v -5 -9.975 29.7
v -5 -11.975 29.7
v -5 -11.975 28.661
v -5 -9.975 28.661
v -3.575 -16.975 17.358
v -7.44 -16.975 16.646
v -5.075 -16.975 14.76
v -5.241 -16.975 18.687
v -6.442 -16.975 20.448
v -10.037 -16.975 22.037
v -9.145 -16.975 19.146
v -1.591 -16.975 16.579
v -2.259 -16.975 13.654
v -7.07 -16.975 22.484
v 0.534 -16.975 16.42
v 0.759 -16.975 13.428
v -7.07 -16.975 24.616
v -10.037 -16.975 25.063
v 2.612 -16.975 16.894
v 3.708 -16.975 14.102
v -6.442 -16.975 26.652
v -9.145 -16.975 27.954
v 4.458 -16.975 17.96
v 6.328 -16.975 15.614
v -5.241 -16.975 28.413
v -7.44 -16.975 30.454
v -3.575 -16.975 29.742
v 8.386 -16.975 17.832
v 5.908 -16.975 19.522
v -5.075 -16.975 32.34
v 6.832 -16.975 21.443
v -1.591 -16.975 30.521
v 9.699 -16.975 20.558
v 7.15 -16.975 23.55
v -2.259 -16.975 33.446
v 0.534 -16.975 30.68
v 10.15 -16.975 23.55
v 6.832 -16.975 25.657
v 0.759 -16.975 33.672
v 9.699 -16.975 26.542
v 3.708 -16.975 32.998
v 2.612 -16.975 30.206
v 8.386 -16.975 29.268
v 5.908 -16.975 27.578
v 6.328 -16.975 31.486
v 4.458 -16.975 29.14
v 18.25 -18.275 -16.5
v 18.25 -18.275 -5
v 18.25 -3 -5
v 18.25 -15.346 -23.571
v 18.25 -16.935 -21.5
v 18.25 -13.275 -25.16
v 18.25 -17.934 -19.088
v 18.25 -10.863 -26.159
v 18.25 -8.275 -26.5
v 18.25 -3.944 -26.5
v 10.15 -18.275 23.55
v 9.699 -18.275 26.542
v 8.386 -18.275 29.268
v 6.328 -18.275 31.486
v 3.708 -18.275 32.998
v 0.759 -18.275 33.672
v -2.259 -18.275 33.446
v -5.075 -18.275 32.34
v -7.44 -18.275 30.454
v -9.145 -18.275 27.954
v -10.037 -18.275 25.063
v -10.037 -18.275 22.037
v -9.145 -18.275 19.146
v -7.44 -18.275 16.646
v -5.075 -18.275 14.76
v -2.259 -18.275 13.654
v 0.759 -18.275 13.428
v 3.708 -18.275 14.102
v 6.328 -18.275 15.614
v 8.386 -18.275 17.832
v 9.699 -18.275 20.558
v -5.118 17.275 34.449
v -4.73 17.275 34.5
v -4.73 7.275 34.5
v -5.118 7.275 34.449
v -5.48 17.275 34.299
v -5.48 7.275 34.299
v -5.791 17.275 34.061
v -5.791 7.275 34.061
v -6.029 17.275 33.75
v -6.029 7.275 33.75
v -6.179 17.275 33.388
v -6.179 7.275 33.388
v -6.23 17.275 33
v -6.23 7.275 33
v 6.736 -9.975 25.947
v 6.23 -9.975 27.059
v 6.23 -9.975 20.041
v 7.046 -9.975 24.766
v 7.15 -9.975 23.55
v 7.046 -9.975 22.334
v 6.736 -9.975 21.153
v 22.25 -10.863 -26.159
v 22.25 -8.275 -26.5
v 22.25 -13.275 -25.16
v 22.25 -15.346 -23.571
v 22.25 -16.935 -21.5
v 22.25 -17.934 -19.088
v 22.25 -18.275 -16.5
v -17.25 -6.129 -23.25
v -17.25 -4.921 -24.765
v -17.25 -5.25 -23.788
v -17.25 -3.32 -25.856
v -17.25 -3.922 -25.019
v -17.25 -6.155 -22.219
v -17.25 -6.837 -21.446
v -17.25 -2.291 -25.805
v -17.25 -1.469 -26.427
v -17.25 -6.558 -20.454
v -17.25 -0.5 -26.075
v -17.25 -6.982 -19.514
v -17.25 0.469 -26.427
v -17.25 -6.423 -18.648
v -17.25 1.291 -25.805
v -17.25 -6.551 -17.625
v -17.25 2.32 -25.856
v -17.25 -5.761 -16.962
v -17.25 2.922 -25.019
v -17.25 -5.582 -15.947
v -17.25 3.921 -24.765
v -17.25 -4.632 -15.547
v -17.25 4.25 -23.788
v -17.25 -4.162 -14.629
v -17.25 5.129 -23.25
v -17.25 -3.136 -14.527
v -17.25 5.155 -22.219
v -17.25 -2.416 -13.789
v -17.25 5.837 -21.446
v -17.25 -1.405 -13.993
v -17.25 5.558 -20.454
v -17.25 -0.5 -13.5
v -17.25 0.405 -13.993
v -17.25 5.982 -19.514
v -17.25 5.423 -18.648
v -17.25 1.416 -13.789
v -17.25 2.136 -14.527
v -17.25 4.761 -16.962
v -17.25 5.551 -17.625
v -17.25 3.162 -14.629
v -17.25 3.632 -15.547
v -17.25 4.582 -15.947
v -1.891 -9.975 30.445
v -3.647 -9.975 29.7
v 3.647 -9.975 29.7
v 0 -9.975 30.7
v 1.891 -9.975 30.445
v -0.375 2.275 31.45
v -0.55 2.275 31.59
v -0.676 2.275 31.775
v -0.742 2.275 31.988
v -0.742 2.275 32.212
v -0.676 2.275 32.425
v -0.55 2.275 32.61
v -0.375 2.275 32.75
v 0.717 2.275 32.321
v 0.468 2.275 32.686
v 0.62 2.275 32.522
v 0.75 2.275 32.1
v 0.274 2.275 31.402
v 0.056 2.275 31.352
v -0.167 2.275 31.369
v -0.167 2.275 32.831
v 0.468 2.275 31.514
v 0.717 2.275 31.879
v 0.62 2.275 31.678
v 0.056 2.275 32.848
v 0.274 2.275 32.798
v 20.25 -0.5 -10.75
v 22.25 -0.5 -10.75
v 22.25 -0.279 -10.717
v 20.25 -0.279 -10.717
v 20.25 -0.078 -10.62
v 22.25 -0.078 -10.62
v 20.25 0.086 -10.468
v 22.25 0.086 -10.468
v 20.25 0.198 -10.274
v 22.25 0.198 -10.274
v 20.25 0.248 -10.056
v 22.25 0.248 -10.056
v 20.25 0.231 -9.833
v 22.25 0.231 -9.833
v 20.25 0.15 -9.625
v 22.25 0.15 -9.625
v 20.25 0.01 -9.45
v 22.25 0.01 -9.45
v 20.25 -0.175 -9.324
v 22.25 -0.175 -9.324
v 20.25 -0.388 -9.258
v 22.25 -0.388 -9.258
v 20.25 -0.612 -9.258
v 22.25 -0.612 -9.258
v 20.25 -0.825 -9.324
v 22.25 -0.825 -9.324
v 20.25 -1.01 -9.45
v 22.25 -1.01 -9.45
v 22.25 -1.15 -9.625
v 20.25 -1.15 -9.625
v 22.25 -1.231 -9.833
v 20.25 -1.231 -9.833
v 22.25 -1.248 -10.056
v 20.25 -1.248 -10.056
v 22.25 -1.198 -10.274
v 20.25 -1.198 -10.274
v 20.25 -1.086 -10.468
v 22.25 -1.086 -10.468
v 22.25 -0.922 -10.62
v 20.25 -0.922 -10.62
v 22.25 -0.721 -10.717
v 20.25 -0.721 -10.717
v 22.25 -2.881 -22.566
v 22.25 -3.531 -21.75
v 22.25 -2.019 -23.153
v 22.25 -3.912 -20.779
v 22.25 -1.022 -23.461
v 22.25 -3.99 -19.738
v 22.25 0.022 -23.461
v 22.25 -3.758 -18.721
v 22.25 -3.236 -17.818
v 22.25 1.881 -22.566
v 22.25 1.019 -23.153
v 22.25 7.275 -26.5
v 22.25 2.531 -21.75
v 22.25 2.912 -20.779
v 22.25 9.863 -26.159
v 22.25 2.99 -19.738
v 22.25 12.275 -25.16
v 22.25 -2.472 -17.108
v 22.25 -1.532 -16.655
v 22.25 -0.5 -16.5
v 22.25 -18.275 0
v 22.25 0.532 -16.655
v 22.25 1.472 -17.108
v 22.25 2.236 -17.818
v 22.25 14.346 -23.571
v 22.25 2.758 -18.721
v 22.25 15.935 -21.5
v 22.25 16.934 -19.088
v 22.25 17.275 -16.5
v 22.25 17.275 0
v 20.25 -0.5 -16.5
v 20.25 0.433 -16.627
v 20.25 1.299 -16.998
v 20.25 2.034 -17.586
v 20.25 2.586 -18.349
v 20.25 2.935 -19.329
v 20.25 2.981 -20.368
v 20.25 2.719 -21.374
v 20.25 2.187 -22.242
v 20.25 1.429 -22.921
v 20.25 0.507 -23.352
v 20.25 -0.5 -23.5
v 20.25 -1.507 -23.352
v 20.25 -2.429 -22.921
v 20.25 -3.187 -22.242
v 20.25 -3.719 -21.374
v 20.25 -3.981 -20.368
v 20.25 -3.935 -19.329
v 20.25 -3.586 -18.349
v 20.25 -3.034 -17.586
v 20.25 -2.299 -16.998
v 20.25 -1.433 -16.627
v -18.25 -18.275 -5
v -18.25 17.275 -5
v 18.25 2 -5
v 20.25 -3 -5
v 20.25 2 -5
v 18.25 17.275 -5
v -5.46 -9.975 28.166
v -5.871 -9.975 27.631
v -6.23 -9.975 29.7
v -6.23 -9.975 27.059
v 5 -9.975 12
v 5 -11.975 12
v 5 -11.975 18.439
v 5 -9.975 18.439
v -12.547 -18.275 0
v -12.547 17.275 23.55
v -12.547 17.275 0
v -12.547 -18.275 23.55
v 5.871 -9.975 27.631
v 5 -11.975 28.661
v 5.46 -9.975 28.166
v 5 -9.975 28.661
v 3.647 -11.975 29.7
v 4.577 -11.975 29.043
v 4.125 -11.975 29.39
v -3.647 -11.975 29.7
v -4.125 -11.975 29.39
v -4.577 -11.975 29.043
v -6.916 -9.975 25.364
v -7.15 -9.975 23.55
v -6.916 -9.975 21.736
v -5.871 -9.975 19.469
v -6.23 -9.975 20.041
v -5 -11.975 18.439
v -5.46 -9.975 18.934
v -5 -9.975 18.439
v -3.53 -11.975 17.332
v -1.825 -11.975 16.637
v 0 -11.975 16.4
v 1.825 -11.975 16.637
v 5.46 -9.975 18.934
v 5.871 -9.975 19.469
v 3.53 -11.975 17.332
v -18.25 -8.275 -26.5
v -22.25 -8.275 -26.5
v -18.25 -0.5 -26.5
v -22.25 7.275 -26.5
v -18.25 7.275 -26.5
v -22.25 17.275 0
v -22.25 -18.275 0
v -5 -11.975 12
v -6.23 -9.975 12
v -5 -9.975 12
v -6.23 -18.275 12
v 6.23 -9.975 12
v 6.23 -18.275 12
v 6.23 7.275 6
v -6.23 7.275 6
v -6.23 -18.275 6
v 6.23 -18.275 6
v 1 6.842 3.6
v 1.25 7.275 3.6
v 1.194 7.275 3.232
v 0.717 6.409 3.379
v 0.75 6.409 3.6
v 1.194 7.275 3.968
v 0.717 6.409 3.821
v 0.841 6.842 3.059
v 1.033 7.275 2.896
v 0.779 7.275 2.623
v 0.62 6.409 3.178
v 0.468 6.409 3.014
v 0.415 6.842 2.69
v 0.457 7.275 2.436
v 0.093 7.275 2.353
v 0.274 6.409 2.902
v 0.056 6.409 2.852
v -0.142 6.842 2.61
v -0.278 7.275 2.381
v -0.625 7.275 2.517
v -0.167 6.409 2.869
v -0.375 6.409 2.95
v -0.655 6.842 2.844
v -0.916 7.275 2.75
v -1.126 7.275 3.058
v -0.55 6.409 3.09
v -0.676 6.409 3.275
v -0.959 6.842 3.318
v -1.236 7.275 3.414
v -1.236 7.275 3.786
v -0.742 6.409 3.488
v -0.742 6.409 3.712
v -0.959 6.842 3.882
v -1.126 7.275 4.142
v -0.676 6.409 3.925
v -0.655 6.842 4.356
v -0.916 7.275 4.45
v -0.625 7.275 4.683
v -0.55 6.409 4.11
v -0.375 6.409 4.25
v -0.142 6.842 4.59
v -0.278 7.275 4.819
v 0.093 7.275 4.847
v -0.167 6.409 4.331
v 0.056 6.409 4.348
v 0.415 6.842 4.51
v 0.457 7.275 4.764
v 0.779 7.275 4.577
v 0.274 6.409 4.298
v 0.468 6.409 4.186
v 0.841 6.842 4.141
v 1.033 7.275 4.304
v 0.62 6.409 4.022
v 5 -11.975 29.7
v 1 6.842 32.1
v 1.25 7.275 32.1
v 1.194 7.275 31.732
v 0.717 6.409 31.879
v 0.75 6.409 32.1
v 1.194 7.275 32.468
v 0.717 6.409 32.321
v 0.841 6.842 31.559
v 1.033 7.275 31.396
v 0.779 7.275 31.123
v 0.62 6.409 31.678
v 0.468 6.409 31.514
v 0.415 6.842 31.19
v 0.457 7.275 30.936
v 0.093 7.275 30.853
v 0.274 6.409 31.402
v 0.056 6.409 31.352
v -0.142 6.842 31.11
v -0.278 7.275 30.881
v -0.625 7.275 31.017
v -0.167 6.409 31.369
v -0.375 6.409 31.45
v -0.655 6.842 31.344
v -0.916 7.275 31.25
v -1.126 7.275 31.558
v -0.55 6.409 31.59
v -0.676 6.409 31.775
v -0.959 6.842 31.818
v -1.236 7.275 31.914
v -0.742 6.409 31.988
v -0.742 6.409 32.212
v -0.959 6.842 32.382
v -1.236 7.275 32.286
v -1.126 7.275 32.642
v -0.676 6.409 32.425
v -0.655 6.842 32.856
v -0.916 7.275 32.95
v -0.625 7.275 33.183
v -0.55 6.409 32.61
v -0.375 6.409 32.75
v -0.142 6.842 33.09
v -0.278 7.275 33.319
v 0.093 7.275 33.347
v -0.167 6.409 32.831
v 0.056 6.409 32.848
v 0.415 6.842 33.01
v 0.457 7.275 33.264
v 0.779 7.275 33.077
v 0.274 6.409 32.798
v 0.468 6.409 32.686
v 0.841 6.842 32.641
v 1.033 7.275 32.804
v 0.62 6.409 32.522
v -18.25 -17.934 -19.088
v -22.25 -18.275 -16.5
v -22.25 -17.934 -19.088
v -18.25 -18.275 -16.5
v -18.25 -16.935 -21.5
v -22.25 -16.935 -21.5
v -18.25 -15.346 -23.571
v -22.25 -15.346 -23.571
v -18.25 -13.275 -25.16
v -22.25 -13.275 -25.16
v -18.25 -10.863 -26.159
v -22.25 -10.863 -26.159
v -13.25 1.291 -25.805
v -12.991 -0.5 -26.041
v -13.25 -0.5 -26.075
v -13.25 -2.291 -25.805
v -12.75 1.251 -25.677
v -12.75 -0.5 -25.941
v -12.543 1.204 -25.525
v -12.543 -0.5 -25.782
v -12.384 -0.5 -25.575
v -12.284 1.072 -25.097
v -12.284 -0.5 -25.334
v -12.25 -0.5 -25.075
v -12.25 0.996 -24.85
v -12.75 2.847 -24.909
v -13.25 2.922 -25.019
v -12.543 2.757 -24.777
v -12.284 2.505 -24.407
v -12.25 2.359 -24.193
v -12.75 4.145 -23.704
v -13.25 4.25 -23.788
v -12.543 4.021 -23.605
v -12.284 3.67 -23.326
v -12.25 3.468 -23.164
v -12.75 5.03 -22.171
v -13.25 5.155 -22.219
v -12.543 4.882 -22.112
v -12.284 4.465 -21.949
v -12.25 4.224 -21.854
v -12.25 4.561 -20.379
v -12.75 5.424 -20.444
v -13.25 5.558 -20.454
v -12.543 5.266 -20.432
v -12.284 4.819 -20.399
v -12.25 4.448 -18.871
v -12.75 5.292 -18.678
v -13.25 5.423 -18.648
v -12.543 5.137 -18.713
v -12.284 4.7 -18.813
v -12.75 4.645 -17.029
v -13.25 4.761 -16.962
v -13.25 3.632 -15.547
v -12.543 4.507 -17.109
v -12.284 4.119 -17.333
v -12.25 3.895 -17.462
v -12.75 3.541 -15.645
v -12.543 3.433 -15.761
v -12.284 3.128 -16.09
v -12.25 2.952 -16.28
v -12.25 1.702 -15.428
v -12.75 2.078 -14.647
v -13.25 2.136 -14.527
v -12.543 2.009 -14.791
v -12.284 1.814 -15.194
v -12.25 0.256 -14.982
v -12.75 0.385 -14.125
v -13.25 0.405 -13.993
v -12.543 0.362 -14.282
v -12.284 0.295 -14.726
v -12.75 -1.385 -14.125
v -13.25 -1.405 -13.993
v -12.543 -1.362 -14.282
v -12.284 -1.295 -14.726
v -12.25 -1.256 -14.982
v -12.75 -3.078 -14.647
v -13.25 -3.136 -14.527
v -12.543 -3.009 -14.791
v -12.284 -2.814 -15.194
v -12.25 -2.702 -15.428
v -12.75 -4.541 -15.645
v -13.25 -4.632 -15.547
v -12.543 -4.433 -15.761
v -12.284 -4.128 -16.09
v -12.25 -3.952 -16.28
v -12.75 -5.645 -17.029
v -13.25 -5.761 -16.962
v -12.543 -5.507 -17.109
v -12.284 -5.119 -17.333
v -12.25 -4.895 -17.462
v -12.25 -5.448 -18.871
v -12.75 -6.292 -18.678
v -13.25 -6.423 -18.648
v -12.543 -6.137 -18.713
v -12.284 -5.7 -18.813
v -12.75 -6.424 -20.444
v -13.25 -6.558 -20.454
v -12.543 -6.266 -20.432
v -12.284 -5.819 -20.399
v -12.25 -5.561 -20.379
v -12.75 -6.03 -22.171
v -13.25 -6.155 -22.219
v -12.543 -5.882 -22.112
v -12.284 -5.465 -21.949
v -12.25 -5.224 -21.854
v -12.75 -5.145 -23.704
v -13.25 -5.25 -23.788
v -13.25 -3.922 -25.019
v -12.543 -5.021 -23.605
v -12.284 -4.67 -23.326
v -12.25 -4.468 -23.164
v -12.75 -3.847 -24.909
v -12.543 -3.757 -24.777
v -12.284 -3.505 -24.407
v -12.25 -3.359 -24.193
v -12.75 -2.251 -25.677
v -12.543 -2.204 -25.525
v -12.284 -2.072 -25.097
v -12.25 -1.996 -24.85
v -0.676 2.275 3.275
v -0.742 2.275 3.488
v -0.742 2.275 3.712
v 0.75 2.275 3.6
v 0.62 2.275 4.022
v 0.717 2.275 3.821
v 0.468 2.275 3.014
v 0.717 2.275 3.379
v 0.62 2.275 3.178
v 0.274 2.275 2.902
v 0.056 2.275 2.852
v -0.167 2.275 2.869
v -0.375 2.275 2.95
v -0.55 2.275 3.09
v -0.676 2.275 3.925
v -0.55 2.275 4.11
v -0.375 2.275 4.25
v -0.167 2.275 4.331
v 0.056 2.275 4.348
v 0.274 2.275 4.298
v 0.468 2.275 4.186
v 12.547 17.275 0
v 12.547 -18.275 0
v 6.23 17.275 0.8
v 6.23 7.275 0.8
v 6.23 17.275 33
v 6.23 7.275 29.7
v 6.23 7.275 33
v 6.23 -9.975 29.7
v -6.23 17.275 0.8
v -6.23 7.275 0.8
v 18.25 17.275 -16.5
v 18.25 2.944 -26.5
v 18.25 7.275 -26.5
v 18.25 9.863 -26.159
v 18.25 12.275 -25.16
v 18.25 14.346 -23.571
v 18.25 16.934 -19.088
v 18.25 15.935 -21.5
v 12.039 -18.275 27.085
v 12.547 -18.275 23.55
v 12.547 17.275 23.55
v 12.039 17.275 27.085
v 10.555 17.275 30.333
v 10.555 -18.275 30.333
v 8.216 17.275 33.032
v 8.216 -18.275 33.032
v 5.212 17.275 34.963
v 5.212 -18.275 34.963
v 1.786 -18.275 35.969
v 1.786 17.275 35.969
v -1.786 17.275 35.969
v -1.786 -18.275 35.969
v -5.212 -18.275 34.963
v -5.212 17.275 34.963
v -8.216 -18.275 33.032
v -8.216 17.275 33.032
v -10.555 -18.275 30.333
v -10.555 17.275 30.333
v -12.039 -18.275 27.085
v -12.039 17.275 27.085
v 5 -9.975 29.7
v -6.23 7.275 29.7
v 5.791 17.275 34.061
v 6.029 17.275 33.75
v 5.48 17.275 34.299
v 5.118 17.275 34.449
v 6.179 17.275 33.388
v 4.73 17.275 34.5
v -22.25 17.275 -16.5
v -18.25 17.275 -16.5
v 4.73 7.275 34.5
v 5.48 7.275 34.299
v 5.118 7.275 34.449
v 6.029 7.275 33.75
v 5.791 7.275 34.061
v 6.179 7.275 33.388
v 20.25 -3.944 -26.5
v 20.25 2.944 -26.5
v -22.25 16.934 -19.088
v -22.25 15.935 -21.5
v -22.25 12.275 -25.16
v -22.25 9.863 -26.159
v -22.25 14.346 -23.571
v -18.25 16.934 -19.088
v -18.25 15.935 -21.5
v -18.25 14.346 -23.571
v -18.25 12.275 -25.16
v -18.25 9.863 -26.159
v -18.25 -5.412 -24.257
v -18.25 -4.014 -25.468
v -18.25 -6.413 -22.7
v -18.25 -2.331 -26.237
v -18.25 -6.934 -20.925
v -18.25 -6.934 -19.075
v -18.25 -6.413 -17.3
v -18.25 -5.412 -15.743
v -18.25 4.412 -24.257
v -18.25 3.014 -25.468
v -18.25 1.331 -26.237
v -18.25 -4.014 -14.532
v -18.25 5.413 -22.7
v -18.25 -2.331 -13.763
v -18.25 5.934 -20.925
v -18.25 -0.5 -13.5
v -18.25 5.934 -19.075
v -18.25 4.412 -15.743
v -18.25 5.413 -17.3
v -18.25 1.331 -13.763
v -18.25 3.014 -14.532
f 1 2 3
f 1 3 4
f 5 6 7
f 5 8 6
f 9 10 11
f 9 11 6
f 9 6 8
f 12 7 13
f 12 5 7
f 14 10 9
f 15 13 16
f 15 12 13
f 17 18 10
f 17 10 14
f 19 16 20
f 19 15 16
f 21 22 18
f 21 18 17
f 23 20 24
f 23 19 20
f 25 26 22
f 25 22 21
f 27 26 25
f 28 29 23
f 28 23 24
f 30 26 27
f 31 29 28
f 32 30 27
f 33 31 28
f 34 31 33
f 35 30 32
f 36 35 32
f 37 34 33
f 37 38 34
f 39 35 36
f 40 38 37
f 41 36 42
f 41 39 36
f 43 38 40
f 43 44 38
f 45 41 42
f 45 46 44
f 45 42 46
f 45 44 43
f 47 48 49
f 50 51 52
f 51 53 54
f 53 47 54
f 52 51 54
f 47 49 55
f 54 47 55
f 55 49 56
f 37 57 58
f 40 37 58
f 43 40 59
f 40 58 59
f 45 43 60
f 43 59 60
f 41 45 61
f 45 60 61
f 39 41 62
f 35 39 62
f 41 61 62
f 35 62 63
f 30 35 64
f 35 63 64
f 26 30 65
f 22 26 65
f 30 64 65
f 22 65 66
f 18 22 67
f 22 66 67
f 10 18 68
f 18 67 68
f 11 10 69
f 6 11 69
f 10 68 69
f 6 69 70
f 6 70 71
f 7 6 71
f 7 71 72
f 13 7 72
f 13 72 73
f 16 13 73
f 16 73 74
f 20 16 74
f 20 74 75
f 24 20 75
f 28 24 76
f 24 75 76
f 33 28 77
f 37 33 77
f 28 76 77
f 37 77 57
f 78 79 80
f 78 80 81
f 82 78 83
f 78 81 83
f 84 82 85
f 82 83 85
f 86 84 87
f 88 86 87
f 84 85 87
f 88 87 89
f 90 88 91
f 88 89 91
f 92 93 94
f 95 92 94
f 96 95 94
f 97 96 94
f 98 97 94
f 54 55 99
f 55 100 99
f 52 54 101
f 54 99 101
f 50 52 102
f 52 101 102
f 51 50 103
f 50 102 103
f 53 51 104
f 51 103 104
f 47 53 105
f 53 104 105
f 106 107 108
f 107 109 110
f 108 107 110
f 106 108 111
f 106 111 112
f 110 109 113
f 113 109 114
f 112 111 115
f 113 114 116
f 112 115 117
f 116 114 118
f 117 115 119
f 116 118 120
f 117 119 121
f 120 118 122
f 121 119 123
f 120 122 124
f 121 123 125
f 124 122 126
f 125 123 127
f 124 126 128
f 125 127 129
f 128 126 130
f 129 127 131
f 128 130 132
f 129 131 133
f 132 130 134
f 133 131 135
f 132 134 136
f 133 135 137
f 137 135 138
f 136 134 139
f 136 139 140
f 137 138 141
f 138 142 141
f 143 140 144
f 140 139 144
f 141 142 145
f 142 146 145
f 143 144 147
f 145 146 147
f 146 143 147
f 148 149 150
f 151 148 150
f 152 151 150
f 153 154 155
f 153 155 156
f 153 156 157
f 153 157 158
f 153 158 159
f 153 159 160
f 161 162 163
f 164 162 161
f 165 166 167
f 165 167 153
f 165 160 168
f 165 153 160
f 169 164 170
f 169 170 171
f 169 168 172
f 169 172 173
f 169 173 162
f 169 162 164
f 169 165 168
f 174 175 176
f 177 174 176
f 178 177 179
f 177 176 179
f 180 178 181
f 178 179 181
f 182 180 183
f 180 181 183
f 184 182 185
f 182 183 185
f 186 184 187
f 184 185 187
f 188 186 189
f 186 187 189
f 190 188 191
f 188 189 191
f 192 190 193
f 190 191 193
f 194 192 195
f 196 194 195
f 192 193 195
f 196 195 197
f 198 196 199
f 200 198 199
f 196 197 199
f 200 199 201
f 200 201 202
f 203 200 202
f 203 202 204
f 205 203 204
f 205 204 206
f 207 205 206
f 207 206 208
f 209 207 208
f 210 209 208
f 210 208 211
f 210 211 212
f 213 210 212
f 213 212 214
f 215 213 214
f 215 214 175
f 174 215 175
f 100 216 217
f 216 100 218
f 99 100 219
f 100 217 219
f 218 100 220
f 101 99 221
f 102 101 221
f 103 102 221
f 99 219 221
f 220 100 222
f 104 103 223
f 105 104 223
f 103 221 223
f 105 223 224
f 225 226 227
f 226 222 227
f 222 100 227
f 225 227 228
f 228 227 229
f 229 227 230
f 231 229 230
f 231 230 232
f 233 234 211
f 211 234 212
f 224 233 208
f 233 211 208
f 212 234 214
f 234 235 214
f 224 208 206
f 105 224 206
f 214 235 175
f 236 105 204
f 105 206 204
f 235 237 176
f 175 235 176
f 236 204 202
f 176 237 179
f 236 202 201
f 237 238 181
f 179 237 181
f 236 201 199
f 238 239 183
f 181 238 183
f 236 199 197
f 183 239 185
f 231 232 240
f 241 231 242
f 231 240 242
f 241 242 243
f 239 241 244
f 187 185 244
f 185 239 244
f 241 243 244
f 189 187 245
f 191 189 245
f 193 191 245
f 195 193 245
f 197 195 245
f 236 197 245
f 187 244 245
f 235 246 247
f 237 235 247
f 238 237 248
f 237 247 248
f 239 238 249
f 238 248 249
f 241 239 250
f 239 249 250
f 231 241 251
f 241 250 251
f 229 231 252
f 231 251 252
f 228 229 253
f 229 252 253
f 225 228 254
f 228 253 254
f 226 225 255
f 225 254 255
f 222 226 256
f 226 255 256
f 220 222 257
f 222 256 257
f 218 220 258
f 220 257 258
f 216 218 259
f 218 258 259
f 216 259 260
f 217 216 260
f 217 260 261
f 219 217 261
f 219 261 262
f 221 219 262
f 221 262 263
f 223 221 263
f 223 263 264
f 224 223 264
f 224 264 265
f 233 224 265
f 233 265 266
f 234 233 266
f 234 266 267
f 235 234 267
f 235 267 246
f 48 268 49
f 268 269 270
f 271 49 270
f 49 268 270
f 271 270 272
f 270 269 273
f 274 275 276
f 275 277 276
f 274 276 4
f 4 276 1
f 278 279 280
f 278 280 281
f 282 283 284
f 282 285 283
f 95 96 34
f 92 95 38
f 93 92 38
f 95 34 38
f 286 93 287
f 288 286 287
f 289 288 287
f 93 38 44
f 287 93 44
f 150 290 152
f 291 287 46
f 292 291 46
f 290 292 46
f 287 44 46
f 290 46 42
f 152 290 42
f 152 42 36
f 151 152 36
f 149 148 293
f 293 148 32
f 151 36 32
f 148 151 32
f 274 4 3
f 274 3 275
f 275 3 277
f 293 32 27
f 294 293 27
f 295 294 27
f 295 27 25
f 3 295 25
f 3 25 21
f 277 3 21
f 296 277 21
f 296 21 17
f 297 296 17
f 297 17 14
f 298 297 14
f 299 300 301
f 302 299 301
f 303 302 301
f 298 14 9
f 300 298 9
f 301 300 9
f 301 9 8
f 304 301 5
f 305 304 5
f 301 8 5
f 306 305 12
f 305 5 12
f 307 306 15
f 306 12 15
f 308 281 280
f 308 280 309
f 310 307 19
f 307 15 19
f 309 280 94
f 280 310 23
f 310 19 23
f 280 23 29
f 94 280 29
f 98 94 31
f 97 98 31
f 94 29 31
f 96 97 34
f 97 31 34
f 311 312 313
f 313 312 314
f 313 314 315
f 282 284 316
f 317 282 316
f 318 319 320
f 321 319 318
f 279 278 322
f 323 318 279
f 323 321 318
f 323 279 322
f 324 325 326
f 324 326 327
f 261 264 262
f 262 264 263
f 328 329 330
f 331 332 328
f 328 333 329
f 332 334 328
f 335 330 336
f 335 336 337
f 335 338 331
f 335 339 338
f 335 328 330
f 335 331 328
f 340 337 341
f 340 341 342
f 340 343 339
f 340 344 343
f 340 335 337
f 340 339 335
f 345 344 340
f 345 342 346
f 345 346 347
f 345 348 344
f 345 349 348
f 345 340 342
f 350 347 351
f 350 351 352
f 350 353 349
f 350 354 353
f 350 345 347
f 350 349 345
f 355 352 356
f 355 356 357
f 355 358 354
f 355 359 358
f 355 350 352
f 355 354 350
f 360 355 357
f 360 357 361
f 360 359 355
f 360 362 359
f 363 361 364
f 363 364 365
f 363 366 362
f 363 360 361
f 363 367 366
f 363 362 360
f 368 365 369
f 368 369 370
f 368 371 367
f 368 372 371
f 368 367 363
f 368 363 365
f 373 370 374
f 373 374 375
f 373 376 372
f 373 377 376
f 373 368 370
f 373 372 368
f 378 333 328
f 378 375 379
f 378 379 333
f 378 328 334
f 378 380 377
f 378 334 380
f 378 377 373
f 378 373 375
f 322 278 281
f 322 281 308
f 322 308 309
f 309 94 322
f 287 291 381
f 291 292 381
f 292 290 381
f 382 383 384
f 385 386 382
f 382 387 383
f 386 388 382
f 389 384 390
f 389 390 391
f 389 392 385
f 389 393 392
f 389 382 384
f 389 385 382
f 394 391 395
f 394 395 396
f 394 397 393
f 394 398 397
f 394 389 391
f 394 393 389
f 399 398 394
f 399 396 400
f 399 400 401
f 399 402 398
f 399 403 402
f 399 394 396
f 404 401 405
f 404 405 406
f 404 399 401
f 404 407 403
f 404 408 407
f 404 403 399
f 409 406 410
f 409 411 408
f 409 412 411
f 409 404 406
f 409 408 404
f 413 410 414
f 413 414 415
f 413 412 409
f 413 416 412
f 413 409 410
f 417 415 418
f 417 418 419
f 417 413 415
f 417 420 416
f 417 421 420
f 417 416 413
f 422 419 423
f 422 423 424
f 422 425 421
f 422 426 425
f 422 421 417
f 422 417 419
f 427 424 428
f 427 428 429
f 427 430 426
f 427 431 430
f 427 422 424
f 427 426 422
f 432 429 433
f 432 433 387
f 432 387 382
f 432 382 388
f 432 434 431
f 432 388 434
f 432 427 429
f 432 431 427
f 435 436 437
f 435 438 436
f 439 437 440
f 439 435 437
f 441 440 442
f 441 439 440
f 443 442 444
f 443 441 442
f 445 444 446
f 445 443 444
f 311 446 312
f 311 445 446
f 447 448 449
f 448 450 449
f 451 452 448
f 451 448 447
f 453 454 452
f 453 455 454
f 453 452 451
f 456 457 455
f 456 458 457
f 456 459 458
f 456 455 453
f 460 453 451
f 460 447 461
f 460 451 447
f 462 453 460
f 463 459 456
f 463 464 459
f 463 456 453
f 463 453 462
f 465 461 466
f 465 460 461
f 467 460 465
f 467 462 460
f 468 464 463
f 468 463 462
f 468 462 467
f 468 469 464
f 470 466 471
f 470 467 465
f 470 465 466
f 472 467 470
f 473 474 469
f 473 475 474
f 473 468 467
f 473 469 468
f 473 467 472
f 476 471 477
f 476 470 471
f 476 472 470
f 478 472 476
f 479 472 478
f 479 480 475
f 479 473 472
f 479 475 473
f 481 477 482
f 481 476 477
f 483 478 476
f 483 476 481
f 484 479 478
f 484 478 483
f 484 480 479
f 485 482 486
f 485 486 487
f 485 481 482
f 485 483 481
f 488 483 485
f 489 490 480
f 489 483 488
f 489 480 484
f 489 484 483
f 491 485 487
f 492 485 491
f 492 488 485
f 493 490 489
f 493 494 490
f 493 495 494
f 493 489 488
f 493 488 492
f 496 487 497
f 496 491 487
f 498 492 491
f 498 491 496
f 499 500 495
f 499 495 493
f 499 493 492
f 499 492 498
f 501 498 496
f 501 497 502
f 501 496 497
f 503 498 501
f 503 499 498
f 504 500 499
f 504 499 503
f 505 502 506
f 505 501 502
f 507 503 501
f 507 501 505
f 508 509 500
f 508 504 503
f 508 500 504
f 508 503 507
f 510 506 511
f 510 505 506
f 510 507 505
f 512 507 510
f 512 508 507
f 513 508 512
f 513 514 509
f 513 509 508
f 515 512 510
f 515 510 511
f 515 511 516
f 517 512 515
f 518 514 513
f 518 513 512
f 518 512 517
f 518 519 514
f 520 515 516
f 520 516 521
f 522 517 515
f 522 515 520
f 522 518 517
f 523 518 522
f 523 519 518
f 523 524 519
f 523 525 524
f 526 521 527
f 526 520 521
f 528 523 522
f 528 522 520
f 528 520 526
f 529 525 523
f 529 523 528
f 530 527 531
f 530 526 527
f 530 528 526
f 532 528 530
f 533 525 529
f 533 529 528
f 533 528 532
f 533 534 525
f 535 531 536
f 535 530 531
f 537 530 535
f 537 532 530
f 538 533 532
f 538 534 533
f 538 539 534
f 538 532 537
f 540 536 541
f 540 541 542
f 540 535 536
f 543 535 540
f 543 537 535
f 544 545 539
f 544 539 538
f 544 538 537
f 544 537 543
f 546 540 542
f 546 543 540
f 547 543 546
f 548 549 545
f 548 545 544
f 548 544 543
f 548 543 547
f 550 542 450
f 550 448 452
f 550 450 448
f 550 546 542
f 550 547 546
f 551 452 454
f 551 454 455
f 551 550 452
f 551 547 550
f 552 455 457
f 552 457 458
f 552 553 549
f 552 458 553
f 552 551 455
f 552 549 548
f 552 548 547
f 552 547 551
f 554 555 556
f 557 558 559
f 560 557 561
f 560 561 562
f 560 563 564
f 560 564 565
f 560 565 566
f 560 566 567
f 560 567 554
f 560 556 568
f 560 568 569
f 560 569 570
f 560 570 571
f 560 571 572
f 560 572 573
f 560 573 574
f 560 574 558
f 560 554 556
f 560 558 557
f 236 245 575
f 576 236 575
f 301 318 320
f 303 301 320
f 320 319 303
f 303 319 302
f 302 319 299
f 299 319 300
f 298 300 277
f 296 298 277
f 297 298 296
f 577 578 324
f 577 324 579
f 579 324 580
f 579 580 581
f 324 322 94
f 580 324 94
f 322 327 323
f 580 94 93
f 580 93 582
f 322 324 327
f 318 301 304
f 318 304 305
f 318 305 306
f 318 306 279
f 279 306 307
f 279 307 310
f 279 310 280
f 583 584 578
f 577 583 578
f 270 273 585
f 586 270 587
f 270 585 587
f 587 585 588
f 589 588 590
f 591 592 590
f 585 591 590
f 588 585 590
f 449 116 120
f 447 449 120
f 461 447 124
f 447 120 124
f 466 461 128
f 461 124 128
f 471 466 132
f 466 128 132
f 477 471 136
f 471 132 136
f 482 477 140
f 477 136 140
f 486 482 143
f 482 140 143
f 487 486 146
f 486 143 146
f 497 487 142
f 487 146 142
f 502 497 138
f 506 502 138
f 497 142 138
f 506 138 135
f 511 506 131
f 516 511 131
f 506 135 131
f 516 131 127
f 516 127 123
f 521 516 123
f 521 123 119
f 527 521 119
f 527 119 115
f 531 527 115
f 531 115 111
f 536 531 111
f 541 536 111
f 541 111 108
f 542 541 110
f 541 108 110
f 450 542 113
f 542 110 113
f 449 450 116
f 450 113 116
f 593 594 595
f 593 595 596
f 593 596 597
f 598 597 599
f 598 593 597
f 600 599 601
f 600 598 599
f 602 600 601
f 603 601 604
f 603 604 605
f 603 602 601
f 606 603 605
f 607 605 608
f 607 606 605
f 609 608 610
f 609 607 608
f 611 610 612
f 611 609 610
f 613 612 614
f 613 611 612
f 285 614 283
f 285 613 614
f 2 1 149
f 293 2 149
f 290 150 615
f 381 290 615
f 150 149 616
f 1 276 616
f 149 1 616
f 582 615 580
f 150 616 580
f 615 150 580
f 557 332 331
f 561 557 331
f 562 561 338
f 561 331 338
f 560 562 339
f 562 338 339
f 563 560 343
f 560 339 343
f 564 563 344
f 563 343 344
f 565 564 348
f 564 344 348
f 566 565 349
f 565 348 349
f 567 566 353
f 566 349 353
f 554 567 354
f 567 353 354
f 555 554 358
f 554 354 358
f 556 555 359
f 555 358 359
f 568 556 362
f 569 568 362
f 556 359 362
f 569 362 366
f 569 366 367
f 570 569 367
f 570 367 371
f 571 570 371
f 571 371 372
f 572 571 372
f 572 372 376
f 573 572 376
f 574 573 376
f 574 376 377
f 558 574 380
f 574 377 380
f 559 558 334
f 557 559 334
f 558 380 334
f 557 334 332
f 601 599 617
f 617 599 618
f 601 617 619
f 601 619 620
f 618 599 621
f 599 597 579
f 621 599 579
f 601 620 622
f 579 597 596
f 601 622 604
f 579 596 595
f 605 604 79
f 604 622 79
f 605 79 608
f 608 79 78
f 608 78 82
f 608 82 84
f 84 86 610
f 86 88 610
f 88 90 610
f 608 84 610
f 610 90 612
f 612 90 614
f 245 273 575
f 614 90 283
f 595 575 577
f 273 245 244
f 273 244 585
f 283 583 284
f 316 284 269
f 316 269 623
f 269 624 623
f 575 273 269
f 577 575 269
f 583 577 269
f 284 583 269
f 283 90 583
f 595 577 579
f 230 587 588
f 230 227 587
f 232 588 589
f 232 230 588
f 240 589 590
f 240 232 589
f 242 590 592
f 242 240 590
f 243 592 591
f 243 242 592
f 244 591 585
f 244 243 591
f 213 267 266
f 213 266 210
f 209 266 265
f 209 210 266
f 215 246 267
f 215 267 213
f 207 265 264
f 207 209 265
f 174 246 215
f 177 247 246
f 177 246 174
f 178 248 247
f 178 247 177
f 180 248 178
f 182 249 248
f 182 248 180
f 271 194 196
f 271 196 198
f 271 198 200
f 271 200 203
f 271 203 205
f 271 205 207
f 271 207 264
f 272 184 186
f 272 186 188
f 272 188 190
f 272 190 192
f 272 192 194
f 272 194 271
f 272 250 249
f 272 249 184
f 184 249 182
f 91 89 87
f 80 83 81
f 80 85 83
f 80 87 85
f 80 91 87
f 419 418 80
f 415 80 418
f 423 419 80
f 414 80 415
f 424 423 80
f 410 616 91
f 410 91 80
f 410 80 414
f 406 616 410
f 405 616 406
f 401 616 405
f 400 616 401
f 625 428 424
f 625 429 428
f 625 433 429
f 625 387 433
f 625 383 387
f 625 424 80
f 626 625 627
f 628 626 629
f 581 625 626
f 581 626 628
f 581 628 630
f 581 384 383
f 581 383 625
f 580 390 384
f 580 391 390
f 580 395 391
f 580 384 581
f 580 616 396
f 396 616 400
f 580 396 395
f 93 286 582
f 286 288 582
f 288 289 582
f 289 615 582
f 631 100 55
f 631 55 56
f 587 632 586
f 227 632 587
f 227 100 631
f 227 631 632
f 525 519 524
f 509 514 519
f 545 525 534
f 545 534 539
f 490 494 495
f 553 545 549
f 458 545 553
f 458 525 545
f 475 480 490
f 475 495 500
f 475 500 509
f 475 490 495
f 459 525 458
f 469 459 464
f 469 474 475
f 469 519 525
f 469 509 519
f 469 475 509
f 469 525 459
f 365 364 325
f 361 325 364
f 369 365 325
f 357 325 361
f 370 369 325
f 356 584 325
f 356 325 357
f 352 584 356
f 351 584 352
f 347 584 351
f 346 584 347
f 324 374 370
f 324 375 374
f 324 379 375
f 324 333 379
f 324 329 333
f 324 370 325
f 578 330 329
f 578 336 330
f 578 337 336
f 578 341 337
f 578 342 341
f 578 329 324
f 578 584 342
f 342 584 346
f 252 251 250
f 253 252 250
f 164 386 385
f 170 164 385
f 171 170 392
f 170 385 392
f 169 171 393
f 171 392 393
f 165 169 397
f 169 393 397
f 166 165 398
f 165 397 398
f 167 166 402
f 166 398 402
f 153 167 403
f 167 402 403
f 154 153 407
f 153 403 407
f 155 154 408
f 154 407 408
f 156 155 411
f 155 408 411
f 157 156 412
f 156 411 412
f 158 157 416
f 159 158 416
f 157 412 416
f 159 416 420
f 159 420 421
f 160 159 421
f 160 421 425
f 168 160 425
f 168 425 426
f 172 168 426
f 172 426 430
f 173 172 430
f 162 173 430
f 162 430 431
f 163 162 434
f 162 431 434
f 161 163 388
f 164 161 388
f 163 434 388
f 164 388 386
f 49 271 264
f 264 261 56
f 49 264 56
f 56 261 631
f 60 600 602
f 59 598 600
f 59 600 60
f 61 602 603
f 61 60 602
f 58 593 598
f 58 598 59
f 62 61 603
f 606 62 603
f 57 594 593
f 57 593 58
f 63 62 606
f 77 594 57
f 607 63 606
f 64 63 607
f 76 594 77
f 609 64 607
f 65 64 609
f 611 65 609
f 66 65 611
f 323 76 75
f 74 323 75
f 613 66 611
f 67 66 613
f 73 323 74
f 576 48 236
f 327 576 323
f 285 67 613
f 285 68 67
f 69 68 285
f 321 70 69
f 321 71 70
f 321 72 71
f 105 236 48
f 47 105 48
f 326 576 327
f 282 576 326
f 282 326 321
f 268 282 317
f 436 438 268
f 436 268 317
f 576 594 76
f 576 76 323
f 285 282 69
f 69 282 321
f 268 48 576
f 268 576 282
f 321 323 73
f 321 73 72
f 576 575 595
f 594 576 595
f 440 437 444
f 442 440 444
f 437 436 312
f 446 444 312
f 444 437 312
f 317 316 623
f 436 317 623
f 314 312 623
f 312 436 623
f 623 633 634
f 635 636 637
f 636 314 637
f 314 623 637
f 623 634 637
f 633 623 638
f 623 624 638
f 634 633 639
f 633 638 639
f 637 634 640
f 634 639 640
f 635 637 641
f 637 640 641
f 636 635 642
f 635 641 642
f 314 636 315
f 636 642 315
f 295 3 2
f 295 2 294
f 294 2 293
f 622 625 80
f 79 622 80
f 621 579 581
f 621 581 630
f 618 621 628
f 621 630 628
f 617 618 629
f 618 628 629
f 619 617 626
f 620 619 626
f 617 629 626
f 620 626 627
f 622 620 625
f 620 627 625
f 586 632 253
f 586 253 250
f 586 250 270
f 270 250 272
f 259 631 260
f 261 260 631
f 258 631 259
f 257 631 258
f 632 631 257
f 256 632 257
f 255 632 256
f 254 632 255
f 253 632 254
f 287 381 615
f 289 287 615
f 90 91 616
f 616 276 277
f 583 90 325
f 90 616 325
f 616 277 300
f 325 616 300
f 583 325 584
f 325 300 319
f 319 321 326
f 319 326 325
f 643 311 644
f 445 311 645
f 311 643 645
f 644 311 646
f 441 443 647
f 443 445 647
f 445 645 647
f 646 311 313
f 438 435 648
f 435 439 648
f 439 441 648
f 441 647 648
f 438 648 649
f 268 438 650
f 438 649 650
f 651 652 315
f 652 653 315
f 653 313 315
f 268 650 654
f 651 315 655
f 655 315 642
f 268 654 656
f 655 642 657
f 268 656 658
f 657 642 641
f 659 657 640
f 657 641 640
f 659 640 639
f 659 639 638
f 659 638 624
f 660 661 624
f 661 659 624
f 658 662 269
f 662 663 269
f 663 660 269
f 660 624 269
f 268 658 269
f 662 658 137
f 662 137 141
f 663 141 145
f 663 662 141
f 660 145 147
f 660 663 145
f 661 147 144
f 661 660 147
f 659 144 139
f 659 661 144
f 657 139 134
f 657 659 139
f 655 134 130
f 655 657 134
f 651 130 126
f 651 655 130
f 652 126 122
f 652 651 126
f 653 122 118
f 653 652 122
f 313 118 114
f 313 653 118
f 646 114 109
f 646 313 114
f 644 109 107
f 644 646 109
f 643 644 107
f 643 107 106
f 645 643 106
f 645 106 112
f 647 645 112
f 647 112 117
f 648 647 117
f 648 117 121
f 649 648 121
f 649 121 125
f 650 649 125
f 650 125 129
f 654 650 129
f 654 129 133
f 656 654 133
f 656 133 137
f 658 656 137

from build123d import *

# Parameters (mm, degrees)
SKETCH4_W                = 12.46
SKETCH4_H                = 17.25
BOSS_EXTRUDE3_DEPTH      = 6
SKETCH8_R                = 12.546781182
SKETCH8_R_2              = 11.15
BOSS_EXTRUDE6_DEPTH      = 8.3
BOSS_EXTRUDE6_DEPTH_BACK = 17.25
BOSS_EXTRUDE4_DEPTH      = 17.25
SKETCH6_R                = 0.75
CUT_EXTRUDE1_DEPTH       = 5
CHAMFER1_SIZE            = 0.5
CHAMFER1_SIZE2           = 0.866025404
SKETCH10_W               = 12.46
SKETCH10_H               = 23.7
CUT_EXTRUDE3_DEPTH       = 17.25
BOSS_EXTRUDE7_DEPTH      = 8.3
BOSS_EXTRUDE9_DEPTH      = 10
SKETCH20_R               = 11.15
SKETCH20_R_2             = 7.15
BOSS_EXTRUDE11_DEPTH     = 8.3
SKETCH21_R               = 10.15
SKETCH21_R_2             = 7.15
CUT_EXTRUDE7_DEPTH       = 1.3
SKETCH11_W               = 10
SKETCH11_H               = 2
CUT_EXTRUDE4_DEPTH       = 23.7
CUT_EXTRUDE8_REACH       = 37.55
SKETCH25_W               = 12.46
SKETCH25_H               = 6
BOSS_EXTRUDE10_DEPTH     = 35.55
SKETCH18_W               = 21.5
SKETCH18_H               = 11.438292938
CUT_EXTRUDE5_DEPTH       = 2
SKETCH19_R               = 3.5
CUT_EXTRUDE6_DEPTH       = 43.5
CUT_EXTRUDE6_DEPTH_BACK  = 3
FILLET1_R                = 10
SKETCH22_R               = 6.5
BOSS_EXTRUDE12_DEPTH     = 5
SKETCH23_R               = 6.075
BOSS_EXTRUDE13_DEPTH     = 5
FILLET2_R                = 1
BOSS_EXTRUDE14_DEPTH     = 2
CUT_EXTRUDE9_REACH       = 46.5
SKETCH27_R               = 0.75


with BuildPart() as part:
    # Sketch4 → Boss-Extrude3 (new body)
    with BuildSketch(Plane.XY):
        with Locations((0, -1.35)):
            Rectangle(SKETCH4_W, SKETCH4_H)
    extrude(amount=BOSS_EXTRUDE3_DEPTH)



with BuildPart() as body_2:
    # Sketch8 → Boss-Extrude6 (new body, two sides)
    with BuildSketch(Plane(origin=(0, -9.975, 0), x_dir=(-1, 0, 0), z_dir=(0, -1, 0))) as boss_extrude6_sk:
        with Locations((0, -23.55)):
            Circle(SKETCH8_R)
        with Locations((0, -23.55)):
            Circle(SKETCH8_R_2, mode=Mode.SUBTRACT)
    extrude(amount=BOSS_EXTRUDE6_DEPTH)
    extrude(boss_extrude6_sk.sketch, amount=-BOSS_EXTRUDE6_DEPTH_BACK)


with BuildPart() as part_1:
    add(part.part)

    add(body_2.part)  # Boss-Extrude4 merges body 2
    # Sketch5 → Boss-Extrude4 (add)
    with BuildSketch(Plane(origin=(0, 7.275, 0), x_dir=(1, 0, 0), z_dir=(0, 1, 0))):
        with BuildLine():
            Line((12.546781182, -23.55), (12.546781182, 0))
            Line((12.546781182, 0), (6.23, 0))
            Line((6.23, 0), (6.23, -29.7))
            Line((6.23, -29.7), (-6.23, -29.7))
            Line((-6.23, -29.7), (-6.23, 0))
            Line((-6.23, 0), (-12.546781182, 0))
            Line((-12.546781182, 0), (-12.546781182, -23.55))
            ThreePointArc((-12.546781182, -23.55), (0, -36.096781182), (12.546781182, -23.55))
        make_face()
    extrude(amount=-BOSS_EXTRUDE4_DEPTH)

    # Sketch6 → Cut-Extrude1 (cut)
    with BuildSketch(Plane(origin=(0, 7.275, 0), x_dir=(1, 0, 0), z_dir=(0, 1, 0))):
        with Locations((0, -3.6)):
            Circle(SKETCH6_R)
        with Locations((0, -32.1)):
            Circle(SKETCH6_R)
    extrude(amount=-CUT_EXTRUDE1_DEPTH, mode=Mode.SUBTRACT)

    # Chamfer1
    chamfer1_edges = [part_1.edges().sort_by_distance(p)[0] for p in [
        (-0.75, 7.275, 3.6),
        (-0.75, 7.275, 32.1),
    ]]
    chamfer1_side = [part_1.faces().sort_by_distance(p)[0] for p in [
        (0, 7.275, 35.657160381),
    ]]
    chamfer(chamfer1_edges, length=CHAMFER1_SIZE, length2=CHAMFER1_SIZE2, reference=chamfer1_side[0])

    # Sketch10 → Cut-Extrude3 (cut)
    with BuildSketch(Plane(origin=(0, 7.275, 0), x_dir=(1, 0, 0), z_dir=(0, 1, 0))):
        with Locations((0, -17.85)):
            Rectangle(SKETCH10_W, SKETCH10_H)
    extrude(amount=-CUT_EXTRUDE3_DEPTH, mode=Mode.SUBTRACT)

    # Sketch13 → Boss-Extrude7 (add)
    with BuildSketch(Plane.XZ.offset(18.275)):
        with BuildLine():
            Line((-12.546781182, 23.55), (-12.546781182, 0))
            Line((-12.546781182, 0), (12.546781182, 0))
            Line((12.546781182, 0), (12.546781182, 23.55))
            ThreePointArc((12.546781182, 23.55), (0, 11.003218818), (-12.546781182, 23.55))
        make_face()
    extrude(amount=-BOSS_EXTRUDE7_DEPTH)

    # Sketch15 → Boss-Extrude9 (add)
    with BuildSketch(Plane(origin=(0, 7.275, 0), x_dir=(1, 0, 0), z_dir=(0, 1, 0))):
        with BuildLine():
            Line((-12.546781182, 0), (12.546781182, 0))
            Line((12.546781182, 0), (12.546781182, -23.55))
            ThreePointArc((12.546781182, -23.55), (0, -36.096781182), (-12.546781182, -23.55))
            Line((-12.546781182, -23.55), (-12.546781182, 0))
        make_face()
        with BuildLine():
            Line((-6.23, -0.8), (6.23, -0.8))
            Line((6.23, -0.8), (6.23, -33))
            ThreePointArc((6.23, -33), (5.790660172, -34.060660172), (4.73, -34.5))
            Line((4.73, -34.5), (-4.73, -34.5))
            ThreePointArc((-4.73, -34.5), (-5.790660172, -34.060660172), (-6.23, -33))
            Line((-6.23, -33), (-6.23, -0.8))
        make_face(mode=Mode.SUBTRACT)
    extrude(amount=BOSS_EXTRUDE9_DEPTH)

    # Sketch20 → Boss-Extrude11 (add)
    with BuildSketch(Plane.XZ.offset(18.275)):
        with Locations((0, 23.55)):
            Circle(SKETCH20_R)
        with Locations((0, 23.55)):
            Circle(SKETCH20_R_2, mode=Mode.SUBTRACT)
    extrude(amount=-BOSS_EXTRUDE11_DEPTH)

    # Sketch21 → Cut-Extrude7 (cut)
    with BuildSketch(Plane.XZ.offset(18.275)):
        with Locations((0, 23.55)):
            Circle(SKETCH21_R)
        with Locations((0, 23.55)):
            Circle(SKETCH21_R_2, mode=Mode.SUBTRACT)
    extrude(amount=-CUT_EXTRUDE7_DEPTH, mode=Mode.SUBTRACT)

    # Sketch11 → Cut-Extrude4 (cut)
    with BuildSketch(Plane.XY.offset(29.7)):
        with Locations((0, -10.975)):
            Rectangle(SKETCH11_W, SKETCH11_H)
    extrude(amount=-CUT_EXTRUDE4_DEPTH, mode=Mode.SUBTRACT)

    # Sketch25 → Cut-Extrude8 (cut, up to next)
    with BuildSketch(Plane.XZ.offset(18.275), mode=Mode.PRIVATE) as cut_extrude8_sk1:
        with Locations((0, 9)):
            Rectangle(SKETCH25_W, SKETCH25_H)
    cut_extrude8_tool1 = extrude(cut_extrude8_sk1.sketch, amount=-CUT_EXTRUDE8_REACH, mode=Mode.PRIVATE) & part_1.part
    add(cut_extrude8_tool1.solids().sort_by_distance((0, -18.275, 9))[0], mode=Mode.SUBTRACT)

    # Sketch17 → Boss-Extrude10 (add)
    with BuildSketch(Plane(origin=(0, 17.275, 0), x_dir=(1, 0, 0), z_dir=(0, 1, 0))):
        Polygon((22.25, 26.5), (22.25, 0), (-22.25, 0), (-22.25, 26.5), (-18.25, 26.5), (-18.25, 5), (18.25, 5), (18.25, 26.5), align=None)
    extrude(amount=-BOSS_EXTRUDE10_DEPTH)

    # Sketch18 → Cut-Extrude5 (cut)
    with BuildSketch(Plane.ZY.offset(-18.25)):
        with Locations((-15.75, -0.5)):
            Rectangle(SKETCH18_W, SKETCH18_H)
    extrude(amount=-CUT_EXTRUDE5_DEPTH, mode=Mode.SUBTRACT)

    # Sketch19 → Cut-Extrude6 (cut, two sides)
    with BuildSketch(Plane.ZY.offset(-20.25)) as cut_extrude6_sk:
        with Locations((-20, -0.5)):
            Circle(SKETCH19_R)
    extrude(amount=CUT_EXTRUDE6_DEPTH, mode=Mode.SUBTRACT)
    extrude(cut_extrude6_sk.sketch, amount=-CUT_EXTRUDE6_DEPTH_BACK, mode=Mode.SUBTRACT)

    # Fillet1
    fillet1_edges = [part_1.edges().sort_by_distance(p)[0] for p in [
        (20.25, 17.275, -26.5),
        (-20.25, 17.275, -26.5),
        (-20.25, -18.275, -26.5),
        (20.25, -18.275, -26.5),
    ]]
    fillet(fillet1_edges, radius=FILLET1_R)

    # Sketch22 → Boss-Extrude12 (add)
    with BuildSketch(Plane.ZY.offset(22.25)):
        with Locations((-20, -0.5)):
            Circle(SKETCH22_R)
    extrude(amount=-BOSS_EXTRUDE12_DEPTH)

    # Sketch23 → Boss-Extrude13 (add)
    with BuildSketch(Plane(origin=(-17.25, 0, 0), x_dir=(0, 0, -1), z_dir=(1, 0, 0))):
        with Locations((20, -0.5)):
            Circle(SKETCH23_R)
    extrude(amount=BOSS_EXTRUDE13_DEPTH)

    # Fillet2
    fillet2_edges = [part_1.edges().sort_by_distance(p)[0] for p in [
        (-12.25, -0.5, -13.925),
    ]]
    fillet(fillet2_edges, radius=FILLET2_R)

    # Sketch26 → Boss-Extrude14 (add)
    with BuildSketch(Plane.ZY.offset(-20.25)):
        Polygon((-5, 2), (-20, 2.6585), (-26.5, 2.94385), (-26.5, 5.219146469), (-5, 5.219146469), align=None)
        Polygon((-20, -3.6585), (-5, -3), (-5, -6.219146469), (-26.5, -6.219146469), (-26.5, -3.94385), align=None)
    extrude(amount=BOSS_EXTRUDE14_DEPTH)

    # Sketch27 → Cut-Extrude9 (cut, up to next)
    with BuildSketch(Plane(origin=(22.25, 0, 0), x_dir=(0, 0, -1), z_dir=(1, 0, 0)), mode=Mode.PRIVATE) as cut_extrude9_sk1:
        with Locations((10, -0.5)):
            Circle(SKETCH27_R)
    cut_extrude9_tool1 = extrude(cut_extrude9_sk1.sketch, amount=-CUT_EXTRUDE9_REACH, mode=Mode.PRIVATE) & part_1.part
    add(cut_extrude9_tool1.solids().sort_by_distance((22.25, -0.5, -10))[0], mode=Mode.SUBTRACT)


solid = part_1.part
